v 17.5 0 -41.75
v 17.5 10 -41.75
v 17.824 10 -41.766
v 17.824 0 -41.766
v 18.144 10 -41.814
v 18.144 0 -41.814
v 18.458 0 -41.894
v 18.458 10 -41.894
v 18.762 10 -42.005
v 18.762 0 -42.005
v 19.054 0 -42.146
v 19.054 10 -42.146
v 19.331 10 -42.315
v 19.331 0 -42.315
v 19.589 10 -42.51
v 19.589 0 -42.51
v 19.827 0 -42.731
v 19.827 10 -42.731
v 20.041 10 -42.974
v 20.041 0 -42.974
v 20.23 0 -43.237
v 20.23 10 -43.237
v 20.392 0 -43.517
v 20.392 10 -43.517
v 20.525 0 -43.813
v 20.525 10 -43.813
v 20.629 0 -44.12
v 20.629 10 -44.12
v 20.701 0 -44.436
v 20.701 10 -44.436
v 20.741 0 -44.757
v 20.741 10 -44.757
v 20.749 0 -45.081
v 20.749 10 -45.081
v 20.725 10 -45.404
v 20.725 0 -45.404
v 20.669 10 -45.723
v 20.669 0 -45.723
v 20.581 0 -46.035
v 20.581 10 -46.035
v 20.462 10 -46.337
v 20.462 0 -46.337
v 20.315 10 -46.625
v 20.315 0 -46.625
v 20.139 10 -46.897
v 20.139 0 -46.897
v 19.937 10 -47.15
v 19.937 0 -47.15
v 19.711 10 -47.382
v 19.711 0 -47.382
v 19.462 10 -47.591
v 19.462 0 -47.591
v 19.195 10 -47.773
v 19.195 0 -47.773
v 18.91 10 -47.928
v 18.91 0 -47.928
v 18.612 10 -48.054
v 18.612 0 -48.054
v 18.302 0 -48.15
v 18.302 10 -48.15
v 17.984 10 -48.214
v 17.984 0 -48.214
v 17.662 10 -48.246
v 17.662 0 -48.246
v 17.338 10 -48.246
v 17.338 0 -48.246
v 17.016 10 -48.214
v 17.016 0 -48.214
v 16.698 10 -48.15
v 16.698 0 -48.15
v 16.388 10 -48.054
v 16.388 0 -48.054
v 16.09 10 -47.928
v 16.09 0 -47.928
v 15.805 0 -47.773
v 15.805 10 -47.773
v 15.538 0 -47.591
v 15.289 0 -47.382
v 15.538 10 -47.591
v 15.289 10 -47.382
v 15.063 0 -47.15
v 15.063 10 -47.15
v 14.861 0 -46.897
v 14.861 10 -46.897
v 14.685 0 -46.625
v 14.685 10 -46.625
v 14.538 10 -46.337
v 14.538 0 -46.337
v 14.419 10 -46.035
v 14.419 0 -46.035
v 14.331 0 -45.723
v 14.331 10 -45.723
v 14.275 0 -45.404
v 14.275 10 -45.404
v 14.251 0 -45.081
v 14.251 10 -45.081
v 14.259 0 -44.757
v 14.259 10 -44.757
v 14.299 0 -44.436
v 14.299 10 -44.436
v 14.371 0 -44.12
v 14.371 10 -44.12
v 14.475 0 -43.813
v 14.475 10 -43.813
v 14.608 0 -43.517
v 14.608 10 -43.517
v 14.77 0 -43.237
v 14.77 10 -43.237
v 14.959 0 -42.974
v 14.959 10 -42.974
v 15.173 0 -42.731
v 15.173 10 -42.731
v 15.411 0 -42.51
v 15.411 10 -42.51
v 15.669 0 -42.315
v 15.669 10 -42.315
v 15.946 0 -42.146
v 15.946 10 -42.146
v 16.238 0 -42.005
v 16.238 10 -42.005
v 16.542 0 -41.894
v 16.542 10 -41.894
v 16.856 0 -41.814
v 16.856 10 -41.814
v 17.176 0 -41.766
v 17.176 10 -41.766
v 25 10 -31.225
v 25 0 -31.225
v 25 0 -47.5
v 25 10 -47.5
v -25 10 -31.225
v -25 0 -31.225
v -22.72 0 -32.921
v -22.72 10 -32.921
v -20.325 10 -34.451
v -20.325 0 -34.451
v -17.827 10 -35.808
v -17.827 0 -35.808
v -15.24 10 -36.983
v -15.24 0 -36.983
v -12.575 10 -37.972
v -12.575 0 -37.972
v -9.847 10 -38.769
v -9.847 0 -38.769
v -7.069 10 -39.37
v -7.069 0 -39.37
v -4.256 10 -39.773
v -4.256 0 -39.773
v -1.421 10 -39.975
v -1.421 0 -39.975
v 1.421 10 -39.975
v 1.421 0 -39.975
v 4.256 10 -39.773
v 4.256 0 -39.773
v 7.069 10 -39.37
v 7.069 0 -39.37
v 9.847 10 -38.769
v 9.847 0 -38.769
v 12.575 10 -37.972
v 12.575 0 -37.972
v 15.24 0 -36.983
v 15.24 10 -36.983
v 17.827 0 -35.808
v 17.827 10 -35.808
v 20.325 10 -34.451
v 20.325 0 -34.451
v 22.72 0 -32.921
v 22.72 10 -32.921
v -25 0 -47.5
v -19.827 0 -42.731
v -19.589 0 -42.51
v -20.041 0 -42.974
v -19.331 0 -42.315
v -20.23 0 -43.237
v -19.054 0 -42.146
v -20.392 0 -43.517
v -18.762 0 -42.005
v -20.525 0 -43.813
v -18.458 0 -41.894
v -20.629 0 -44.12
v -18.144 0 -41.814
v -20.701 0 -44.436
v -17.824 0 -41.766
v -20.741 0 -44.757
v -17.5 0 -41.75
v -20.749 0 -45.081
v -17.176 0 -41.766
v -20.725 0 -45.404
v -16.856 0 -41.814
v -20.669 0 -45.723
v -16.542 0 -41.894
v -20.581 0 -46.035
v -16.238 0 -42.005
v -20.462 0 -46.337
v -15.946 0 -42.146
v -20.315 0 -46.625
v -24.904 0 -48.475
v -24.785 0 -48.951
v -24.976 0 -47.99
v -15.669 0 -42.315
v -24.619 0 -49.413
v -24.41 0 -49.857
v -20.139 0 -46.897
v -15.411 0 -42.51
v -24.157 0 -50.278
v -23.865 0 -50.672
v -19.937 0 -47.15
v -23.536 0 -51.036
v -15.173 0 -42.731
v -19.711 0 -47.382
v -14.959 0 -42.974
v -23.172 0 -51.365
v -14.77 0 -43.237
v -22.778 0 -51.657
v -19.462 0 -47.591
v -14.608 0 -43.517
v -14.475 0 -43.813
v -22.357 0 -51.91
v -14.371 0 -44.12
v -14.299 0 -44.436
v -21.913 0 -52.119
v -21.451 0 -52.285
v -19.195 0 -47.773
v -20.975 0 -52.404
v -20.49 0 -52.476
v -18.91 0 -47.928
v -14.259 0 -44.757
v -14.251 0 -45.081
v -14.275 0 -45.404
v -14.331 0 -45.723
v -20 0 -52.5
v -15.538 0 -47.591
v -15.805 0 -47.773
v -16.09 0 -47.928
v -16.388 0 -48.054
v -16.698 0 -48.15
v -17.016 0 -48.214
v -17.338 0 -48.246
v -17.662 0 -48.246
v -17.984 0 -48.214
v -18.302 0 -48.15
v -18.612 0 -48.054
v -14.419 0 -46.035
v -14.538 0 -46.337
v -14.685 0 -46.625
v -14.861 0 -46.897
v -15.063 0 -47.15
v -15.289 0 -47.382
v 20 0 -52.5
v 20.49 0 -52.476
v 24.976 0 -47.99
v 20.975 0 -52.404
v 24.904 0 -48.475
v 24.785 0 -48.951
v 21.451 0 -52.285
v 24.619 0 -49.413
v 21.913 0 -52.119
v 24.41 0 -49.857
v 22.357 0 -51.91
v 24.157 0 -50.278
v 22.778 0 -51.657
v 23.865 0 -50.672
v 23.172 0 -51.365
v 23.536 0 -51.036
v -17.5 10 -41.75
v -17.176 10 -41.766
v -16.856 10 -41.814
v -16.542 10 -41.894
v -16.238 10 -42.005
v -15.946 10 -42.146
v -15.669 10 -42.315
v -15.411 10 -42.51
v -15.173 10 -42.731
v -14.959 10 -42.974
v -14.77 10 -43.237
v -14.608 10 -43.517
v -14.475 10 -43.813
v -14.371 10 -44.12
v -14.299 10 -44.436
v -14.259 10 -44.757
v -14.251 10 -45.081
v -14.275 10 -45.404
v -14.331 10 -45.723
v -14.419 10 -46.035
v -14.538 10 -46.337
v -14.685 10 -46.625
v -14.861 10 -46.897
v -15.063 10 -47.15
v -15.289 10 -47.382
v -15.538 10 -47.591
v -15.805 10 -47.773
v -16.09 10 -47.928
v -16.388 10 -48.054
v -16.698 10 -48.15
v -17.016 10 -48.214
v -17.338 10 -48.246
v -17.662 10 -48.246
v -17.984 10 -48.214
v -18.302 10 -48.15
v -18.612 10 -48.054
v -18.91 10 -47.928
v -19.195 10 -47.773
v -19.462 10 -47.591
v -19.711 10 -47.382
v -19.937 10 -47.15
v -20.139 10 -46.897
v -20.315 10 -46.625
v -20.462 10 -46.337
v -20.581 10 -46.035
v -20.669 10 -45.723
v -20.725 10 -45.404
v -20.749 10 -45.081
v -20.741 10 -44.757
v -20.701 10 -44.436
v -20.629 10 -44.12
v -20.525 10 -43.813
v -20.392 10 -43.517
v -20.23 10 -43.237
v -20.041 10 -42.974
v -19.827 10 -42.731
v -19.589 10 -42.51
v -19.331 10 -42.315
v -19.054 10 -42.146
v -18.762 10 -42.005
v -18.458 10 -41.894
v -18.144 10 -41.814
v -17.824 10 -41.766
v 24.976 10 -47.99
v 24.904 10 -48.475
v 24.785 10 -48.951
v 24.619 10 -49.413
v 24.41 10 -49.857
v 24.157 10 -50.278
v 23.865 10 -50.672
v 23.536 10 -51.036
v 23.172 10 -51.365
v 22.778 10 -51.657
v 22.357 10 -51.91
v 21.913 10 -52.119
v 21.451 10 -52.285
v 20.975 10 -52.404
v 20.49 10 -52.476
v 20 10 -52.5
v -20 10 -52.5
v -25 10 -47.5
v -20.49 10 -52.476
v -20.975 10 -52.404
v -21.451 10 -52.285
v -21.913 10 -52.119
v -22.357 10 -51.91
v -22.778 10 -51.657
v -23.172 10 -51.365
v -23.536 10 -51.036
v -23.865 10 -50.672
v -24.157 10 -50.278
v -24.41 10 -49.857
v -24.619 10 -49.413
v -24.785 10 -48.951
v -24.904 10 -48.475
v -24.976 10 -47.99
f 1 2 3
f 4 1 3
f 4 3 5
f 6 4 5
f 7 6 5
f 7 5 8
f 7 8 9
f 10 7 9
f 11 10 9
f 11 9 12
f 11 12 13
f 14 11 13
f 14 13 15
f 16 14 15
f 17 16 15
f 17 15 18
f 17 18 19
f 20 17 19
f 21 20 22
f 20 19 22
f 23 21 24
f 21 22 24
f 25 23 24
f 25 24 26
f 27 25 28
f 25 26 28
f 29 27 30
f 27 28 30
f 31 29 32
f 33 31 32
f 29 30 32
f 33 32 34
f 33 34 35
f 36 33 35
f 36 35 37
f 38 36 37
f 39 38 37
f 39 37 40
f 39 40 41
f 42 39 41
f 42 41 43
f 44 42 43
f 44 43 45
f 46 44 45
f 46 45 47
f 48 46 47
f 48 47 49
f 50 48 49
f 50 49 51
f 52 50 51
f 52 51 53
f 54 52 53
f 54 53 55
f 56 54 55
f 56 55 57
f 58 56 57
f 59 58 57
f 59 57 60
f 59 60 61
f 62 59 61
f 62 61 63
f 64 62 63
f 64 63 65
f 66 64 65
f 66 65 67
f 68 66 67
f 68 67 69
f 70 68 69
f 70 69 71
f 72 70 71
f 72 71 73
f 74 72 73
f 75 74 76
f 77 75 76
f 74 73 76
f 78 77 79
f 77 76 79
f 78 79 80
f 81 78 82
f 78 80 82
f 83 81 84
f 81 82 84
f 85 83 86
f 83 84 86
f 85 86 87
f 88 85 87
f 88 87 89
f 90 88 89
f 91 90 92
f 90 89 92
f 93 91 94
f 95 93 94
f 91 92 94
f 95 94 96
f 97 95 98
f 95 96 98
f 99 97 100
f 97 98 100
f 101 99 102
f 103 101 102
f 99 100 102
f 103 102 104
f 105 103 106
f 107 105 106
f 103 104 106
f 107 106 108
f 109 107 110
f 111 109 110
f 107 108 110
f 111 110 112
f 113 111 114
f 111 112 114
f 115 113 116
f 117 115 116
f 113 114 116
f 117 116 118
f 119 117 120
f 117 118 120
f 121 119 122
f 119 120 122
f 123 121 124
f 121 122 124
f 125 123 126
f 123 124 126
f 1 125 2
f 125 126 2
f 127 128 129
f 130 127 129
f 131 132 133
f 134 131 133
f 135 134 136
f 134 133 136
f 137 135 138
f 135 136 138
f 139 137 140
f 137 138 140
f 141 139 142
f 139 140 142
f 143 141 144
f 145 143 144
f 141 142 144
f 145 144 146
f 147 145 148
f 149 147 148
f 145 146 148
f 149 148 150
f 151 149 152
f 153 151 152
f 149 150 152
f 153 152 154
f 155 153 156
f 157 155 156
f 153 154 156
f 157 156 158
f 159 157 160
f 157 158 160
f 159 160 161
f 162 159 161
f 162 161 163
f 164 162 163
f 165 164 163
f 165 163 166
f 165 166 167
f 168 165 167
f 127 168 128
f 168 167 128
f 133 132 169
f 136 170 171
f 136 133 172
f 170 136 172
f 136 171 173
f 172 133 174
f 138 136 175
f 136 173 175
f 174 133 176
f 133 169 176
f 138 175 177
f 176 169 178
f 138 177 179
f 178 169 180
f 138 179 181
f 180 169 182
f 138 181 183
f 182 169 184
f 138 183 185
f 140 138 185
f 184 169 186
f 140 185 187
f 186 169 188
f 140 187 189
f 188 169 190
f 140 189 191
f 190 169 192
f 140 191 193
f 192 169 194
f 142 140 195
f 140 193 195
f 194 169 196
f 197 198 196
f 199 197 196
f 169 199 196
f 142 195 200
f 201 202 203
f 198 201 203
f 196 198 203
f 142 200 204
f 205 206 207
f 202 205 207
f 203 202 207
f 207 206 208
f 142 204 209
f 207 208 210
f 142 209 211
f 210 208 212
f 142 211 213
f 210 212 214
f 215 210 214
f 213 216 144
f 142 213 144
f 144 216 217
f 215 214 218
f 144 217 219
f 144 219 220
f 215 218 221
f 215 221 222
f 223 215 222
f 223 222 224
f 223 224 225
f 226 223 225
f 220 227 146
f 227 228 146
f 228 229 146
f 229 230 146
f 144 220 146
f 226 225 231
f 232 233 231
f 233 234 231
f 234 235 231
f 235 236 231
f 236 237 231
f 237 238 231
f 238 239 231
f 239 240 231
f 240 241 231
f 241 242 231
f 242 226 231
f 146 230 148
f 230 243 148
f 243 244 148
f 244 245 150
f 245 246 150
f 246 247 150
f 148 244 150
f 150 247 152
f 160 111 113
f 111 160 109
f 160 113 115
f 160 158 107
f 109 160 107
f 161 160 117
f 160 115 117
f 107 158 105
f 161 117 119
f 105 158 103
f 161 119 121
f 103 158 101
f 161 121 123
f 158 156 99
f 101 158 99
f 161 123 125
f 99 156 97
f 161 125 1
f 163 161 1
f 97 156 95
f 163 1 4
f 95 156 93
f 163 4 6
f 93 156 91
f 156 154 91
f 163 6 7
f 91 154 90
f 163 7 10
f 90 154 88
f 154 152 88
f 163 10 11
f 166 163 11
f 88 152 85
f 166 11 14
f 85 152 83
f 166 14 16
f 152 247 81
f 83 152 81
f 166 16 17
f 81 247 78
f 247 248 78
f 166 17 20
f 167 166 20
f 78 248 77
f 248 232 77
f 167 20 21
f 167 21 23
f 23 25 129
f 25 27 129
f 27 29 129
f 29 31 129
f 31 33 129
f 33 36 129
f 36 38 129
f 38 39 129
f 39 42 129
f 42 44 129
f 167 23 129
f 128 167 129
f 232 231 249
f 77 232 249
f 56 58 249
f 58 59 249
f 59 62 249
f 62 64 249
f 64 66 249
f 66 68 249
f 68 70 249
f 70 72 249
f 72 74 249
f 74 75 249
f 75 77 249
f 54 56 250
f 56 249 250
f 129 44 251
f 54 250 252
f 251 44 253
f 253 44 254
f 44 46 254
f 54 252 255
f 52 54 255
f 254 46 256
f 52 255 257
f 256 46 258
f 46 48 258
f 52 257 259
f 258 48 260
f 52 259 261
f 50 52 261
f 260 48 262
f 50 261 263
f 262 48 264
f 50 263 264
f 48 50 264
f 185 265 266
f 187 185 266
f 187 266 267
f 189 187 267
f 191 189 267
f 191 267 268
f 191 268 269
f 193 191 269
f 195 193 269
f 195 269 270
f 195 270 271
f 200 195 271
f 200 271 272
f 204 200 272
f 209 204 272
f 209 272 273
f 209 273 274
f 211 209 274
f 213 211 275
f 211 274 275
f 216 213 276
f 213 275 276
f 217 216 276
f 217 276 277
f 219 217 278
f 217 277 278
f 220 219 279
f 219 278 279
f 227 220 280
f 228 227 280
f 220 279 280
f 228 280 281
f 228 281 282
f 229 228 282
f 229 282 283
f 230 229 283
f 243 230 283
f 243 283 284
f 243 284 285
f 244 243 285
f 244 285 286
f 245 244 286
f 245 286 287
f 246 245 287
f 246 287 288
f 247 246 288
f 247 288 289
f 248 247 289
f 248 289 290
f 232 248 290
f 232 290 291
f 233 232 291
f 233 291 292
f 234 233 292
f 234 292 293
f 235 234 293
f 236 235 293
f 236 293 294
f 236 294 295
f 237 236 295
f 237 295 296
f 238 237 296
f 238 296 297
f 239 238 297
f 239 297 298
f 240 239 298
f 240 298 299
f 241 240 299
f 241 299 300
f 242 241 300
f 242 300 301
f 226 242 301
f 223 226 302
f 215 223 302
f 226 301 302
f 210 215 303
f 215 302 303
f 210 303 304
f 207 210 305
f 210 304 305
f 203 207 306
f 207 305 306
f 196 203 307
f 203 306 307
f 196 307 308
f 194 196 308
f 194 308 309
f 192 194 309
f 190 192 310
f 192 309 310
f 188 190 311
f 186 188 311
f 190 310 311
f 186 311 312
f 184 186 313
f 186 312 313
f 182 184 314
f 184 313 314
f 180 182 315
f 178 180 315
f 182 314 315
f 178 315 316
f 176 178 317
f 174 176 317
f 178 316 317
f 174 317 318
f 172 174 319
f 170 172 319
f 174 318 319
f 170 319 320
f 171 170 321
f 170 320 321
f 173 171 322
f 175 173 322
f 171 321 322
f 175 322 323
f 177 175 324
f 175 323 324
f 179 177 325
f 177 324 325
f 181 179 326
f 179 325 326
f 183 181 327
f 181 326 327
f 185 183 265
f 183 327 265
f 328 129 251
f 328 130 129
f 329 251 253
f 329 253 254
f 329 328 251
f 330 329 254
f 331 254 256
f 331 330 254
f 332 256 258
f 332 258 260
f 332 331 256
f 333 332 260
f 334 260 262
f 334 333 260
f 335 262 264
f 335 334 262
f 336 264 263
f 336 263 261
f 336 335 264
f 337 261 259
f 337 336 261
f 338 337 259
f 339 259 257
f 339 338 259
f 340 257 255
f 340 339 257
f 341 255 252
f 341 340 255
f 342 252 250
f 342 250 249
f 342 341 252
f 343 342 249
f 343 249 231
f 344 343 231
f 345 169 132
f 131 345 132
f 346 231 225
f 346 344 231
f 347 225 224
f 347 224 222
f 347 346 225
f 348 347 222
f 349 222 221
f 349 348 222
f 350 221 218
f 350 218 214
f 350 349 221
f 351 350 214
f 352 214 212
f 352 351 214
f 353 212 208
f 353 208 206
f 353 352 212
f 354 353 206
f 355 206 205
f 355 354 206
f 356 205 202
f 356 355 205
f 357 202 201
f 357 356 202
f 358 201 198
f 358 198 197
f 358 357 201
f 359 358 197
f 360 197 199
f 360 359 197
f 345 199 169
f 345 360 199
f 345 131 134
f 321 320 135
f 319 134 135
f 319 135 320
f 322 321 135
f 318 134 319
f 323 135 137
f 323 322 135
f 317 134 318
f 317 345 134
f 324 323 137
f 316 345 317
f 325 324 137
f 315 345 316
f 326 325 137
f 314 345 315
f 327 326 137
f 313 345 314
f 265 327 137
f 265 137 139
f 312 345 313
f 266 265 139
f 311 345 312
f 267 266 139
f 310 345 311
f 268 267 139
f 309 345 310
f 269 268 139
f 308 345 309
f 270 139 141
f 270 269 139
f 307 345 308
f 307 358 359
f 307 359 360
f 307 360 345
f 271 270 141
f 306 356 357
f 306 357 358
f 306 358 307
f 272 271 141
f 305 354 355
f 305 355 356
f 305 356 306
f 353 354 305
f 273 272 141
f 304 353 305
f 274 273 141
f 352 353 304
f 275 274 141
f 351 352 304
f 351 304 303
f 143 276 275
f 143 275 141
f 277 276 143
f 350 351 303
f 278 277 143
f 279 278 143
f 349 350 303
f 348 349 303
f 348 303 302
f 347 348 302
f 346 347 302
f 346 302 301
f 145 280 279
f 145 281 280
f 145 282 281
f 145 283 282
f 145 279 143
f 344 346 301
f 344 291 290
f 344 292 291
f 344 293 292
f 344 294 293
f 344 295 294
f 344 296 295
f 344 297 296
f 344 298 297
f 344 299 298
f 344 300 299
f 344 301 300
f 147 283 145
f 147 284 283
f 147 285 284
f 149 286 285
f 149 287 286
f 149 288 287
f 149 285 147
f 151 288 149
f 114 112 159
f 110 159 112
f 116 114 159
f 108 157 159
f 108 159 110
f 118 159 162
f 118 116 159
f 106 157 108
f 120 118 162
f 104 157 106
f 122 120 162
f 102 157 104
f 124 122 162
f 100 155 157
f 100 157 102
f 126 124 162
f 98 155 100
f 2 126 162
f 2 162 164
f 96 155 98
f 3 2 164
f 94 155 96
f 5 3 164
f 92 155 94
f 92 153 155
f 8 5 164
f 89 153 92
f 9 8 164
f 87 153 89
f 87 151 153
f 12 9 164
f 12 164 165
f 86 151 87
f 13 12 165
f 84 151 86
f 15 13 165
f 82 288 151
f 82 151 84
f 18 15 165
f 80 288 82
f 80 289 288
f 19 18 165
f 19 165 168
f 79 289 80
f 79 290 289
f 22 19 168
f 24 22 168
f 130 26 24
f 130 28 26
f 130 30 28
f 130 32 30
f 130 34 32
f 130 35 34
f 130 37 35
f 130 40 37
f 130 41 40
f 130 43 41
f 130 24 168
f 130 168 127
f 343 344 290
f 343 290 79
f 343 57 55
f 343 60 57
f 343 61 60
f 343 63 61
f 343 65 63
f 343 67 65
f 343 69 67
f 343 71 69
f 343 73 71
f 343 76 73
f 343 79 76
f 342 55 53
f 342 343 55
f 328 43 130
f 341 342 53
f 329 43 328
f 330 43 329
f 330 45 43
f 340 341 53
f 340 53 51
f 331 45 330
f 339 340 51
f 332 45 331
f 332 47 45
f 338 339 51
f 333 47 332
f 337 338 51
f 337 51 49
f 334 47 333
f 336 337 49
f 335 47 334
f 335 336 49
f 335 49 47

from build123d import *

# Parameters (mm, degrees)
BOSS_EXTRU_1_DEPTH      = 10
CONG_1_R                = 5
ESQUISSE3_R             = 3.25
ENL_V_MAT_EXTRU_1_DEPTH = 11


with BuildPart() as part:
    # Esquisse1 → Boss.-Extru.1 (new body)
    with BuildSketch(Plane(origin=(0, 0, 0), x_dir=(1, 0, 0), z_dir=(0, 1, 0))):
        with BuildLine():
            Line((25, 31.224989992), (25, 52.5))
            Line((25, 52.5), (-25, 52.5))
            Line((-25, 52.5), (-25, 31.224989992))
            ThreePointArc((-25, 31.224989992), (0, 40), (25, 31.224989992))
        make_face()
    extrude(amount=BOSS_EXTRU_1_DEPTH)

    # Congé1
    cong_1_edges = [part.edges().sort_by_distance(p)[0] for p in [
        (-25, 5, -52.5),
        (25, 5, -52.5),
    ]]
    fillet(cong_1_edges, radius=CONG_1_R)

    # Esquisse3 → Enlèv. mat.-Extru.1 (cut, through all)
    with BuildSketch(Plane(origin=(0, 10, 0), x_dir=(1, 0, 0), z_dir=(0, 1, 0))):
        with Locations(Location((-17.5, 45, 0), (0, 0, 270))):  # turned: the seam where the file's is
            Circle(ESQUISSE3_R)
        with Locations(Location((17.5, 45, 0), (0, 0, 270))):  # turned: the seam where the file's is
            Circle(ESQUISSE3_R)
    extrude(amount=-ENL_V_MAT_EXTRU_1_DEPTH, mode=Mode.SUBTRACT)


solid = part.part
